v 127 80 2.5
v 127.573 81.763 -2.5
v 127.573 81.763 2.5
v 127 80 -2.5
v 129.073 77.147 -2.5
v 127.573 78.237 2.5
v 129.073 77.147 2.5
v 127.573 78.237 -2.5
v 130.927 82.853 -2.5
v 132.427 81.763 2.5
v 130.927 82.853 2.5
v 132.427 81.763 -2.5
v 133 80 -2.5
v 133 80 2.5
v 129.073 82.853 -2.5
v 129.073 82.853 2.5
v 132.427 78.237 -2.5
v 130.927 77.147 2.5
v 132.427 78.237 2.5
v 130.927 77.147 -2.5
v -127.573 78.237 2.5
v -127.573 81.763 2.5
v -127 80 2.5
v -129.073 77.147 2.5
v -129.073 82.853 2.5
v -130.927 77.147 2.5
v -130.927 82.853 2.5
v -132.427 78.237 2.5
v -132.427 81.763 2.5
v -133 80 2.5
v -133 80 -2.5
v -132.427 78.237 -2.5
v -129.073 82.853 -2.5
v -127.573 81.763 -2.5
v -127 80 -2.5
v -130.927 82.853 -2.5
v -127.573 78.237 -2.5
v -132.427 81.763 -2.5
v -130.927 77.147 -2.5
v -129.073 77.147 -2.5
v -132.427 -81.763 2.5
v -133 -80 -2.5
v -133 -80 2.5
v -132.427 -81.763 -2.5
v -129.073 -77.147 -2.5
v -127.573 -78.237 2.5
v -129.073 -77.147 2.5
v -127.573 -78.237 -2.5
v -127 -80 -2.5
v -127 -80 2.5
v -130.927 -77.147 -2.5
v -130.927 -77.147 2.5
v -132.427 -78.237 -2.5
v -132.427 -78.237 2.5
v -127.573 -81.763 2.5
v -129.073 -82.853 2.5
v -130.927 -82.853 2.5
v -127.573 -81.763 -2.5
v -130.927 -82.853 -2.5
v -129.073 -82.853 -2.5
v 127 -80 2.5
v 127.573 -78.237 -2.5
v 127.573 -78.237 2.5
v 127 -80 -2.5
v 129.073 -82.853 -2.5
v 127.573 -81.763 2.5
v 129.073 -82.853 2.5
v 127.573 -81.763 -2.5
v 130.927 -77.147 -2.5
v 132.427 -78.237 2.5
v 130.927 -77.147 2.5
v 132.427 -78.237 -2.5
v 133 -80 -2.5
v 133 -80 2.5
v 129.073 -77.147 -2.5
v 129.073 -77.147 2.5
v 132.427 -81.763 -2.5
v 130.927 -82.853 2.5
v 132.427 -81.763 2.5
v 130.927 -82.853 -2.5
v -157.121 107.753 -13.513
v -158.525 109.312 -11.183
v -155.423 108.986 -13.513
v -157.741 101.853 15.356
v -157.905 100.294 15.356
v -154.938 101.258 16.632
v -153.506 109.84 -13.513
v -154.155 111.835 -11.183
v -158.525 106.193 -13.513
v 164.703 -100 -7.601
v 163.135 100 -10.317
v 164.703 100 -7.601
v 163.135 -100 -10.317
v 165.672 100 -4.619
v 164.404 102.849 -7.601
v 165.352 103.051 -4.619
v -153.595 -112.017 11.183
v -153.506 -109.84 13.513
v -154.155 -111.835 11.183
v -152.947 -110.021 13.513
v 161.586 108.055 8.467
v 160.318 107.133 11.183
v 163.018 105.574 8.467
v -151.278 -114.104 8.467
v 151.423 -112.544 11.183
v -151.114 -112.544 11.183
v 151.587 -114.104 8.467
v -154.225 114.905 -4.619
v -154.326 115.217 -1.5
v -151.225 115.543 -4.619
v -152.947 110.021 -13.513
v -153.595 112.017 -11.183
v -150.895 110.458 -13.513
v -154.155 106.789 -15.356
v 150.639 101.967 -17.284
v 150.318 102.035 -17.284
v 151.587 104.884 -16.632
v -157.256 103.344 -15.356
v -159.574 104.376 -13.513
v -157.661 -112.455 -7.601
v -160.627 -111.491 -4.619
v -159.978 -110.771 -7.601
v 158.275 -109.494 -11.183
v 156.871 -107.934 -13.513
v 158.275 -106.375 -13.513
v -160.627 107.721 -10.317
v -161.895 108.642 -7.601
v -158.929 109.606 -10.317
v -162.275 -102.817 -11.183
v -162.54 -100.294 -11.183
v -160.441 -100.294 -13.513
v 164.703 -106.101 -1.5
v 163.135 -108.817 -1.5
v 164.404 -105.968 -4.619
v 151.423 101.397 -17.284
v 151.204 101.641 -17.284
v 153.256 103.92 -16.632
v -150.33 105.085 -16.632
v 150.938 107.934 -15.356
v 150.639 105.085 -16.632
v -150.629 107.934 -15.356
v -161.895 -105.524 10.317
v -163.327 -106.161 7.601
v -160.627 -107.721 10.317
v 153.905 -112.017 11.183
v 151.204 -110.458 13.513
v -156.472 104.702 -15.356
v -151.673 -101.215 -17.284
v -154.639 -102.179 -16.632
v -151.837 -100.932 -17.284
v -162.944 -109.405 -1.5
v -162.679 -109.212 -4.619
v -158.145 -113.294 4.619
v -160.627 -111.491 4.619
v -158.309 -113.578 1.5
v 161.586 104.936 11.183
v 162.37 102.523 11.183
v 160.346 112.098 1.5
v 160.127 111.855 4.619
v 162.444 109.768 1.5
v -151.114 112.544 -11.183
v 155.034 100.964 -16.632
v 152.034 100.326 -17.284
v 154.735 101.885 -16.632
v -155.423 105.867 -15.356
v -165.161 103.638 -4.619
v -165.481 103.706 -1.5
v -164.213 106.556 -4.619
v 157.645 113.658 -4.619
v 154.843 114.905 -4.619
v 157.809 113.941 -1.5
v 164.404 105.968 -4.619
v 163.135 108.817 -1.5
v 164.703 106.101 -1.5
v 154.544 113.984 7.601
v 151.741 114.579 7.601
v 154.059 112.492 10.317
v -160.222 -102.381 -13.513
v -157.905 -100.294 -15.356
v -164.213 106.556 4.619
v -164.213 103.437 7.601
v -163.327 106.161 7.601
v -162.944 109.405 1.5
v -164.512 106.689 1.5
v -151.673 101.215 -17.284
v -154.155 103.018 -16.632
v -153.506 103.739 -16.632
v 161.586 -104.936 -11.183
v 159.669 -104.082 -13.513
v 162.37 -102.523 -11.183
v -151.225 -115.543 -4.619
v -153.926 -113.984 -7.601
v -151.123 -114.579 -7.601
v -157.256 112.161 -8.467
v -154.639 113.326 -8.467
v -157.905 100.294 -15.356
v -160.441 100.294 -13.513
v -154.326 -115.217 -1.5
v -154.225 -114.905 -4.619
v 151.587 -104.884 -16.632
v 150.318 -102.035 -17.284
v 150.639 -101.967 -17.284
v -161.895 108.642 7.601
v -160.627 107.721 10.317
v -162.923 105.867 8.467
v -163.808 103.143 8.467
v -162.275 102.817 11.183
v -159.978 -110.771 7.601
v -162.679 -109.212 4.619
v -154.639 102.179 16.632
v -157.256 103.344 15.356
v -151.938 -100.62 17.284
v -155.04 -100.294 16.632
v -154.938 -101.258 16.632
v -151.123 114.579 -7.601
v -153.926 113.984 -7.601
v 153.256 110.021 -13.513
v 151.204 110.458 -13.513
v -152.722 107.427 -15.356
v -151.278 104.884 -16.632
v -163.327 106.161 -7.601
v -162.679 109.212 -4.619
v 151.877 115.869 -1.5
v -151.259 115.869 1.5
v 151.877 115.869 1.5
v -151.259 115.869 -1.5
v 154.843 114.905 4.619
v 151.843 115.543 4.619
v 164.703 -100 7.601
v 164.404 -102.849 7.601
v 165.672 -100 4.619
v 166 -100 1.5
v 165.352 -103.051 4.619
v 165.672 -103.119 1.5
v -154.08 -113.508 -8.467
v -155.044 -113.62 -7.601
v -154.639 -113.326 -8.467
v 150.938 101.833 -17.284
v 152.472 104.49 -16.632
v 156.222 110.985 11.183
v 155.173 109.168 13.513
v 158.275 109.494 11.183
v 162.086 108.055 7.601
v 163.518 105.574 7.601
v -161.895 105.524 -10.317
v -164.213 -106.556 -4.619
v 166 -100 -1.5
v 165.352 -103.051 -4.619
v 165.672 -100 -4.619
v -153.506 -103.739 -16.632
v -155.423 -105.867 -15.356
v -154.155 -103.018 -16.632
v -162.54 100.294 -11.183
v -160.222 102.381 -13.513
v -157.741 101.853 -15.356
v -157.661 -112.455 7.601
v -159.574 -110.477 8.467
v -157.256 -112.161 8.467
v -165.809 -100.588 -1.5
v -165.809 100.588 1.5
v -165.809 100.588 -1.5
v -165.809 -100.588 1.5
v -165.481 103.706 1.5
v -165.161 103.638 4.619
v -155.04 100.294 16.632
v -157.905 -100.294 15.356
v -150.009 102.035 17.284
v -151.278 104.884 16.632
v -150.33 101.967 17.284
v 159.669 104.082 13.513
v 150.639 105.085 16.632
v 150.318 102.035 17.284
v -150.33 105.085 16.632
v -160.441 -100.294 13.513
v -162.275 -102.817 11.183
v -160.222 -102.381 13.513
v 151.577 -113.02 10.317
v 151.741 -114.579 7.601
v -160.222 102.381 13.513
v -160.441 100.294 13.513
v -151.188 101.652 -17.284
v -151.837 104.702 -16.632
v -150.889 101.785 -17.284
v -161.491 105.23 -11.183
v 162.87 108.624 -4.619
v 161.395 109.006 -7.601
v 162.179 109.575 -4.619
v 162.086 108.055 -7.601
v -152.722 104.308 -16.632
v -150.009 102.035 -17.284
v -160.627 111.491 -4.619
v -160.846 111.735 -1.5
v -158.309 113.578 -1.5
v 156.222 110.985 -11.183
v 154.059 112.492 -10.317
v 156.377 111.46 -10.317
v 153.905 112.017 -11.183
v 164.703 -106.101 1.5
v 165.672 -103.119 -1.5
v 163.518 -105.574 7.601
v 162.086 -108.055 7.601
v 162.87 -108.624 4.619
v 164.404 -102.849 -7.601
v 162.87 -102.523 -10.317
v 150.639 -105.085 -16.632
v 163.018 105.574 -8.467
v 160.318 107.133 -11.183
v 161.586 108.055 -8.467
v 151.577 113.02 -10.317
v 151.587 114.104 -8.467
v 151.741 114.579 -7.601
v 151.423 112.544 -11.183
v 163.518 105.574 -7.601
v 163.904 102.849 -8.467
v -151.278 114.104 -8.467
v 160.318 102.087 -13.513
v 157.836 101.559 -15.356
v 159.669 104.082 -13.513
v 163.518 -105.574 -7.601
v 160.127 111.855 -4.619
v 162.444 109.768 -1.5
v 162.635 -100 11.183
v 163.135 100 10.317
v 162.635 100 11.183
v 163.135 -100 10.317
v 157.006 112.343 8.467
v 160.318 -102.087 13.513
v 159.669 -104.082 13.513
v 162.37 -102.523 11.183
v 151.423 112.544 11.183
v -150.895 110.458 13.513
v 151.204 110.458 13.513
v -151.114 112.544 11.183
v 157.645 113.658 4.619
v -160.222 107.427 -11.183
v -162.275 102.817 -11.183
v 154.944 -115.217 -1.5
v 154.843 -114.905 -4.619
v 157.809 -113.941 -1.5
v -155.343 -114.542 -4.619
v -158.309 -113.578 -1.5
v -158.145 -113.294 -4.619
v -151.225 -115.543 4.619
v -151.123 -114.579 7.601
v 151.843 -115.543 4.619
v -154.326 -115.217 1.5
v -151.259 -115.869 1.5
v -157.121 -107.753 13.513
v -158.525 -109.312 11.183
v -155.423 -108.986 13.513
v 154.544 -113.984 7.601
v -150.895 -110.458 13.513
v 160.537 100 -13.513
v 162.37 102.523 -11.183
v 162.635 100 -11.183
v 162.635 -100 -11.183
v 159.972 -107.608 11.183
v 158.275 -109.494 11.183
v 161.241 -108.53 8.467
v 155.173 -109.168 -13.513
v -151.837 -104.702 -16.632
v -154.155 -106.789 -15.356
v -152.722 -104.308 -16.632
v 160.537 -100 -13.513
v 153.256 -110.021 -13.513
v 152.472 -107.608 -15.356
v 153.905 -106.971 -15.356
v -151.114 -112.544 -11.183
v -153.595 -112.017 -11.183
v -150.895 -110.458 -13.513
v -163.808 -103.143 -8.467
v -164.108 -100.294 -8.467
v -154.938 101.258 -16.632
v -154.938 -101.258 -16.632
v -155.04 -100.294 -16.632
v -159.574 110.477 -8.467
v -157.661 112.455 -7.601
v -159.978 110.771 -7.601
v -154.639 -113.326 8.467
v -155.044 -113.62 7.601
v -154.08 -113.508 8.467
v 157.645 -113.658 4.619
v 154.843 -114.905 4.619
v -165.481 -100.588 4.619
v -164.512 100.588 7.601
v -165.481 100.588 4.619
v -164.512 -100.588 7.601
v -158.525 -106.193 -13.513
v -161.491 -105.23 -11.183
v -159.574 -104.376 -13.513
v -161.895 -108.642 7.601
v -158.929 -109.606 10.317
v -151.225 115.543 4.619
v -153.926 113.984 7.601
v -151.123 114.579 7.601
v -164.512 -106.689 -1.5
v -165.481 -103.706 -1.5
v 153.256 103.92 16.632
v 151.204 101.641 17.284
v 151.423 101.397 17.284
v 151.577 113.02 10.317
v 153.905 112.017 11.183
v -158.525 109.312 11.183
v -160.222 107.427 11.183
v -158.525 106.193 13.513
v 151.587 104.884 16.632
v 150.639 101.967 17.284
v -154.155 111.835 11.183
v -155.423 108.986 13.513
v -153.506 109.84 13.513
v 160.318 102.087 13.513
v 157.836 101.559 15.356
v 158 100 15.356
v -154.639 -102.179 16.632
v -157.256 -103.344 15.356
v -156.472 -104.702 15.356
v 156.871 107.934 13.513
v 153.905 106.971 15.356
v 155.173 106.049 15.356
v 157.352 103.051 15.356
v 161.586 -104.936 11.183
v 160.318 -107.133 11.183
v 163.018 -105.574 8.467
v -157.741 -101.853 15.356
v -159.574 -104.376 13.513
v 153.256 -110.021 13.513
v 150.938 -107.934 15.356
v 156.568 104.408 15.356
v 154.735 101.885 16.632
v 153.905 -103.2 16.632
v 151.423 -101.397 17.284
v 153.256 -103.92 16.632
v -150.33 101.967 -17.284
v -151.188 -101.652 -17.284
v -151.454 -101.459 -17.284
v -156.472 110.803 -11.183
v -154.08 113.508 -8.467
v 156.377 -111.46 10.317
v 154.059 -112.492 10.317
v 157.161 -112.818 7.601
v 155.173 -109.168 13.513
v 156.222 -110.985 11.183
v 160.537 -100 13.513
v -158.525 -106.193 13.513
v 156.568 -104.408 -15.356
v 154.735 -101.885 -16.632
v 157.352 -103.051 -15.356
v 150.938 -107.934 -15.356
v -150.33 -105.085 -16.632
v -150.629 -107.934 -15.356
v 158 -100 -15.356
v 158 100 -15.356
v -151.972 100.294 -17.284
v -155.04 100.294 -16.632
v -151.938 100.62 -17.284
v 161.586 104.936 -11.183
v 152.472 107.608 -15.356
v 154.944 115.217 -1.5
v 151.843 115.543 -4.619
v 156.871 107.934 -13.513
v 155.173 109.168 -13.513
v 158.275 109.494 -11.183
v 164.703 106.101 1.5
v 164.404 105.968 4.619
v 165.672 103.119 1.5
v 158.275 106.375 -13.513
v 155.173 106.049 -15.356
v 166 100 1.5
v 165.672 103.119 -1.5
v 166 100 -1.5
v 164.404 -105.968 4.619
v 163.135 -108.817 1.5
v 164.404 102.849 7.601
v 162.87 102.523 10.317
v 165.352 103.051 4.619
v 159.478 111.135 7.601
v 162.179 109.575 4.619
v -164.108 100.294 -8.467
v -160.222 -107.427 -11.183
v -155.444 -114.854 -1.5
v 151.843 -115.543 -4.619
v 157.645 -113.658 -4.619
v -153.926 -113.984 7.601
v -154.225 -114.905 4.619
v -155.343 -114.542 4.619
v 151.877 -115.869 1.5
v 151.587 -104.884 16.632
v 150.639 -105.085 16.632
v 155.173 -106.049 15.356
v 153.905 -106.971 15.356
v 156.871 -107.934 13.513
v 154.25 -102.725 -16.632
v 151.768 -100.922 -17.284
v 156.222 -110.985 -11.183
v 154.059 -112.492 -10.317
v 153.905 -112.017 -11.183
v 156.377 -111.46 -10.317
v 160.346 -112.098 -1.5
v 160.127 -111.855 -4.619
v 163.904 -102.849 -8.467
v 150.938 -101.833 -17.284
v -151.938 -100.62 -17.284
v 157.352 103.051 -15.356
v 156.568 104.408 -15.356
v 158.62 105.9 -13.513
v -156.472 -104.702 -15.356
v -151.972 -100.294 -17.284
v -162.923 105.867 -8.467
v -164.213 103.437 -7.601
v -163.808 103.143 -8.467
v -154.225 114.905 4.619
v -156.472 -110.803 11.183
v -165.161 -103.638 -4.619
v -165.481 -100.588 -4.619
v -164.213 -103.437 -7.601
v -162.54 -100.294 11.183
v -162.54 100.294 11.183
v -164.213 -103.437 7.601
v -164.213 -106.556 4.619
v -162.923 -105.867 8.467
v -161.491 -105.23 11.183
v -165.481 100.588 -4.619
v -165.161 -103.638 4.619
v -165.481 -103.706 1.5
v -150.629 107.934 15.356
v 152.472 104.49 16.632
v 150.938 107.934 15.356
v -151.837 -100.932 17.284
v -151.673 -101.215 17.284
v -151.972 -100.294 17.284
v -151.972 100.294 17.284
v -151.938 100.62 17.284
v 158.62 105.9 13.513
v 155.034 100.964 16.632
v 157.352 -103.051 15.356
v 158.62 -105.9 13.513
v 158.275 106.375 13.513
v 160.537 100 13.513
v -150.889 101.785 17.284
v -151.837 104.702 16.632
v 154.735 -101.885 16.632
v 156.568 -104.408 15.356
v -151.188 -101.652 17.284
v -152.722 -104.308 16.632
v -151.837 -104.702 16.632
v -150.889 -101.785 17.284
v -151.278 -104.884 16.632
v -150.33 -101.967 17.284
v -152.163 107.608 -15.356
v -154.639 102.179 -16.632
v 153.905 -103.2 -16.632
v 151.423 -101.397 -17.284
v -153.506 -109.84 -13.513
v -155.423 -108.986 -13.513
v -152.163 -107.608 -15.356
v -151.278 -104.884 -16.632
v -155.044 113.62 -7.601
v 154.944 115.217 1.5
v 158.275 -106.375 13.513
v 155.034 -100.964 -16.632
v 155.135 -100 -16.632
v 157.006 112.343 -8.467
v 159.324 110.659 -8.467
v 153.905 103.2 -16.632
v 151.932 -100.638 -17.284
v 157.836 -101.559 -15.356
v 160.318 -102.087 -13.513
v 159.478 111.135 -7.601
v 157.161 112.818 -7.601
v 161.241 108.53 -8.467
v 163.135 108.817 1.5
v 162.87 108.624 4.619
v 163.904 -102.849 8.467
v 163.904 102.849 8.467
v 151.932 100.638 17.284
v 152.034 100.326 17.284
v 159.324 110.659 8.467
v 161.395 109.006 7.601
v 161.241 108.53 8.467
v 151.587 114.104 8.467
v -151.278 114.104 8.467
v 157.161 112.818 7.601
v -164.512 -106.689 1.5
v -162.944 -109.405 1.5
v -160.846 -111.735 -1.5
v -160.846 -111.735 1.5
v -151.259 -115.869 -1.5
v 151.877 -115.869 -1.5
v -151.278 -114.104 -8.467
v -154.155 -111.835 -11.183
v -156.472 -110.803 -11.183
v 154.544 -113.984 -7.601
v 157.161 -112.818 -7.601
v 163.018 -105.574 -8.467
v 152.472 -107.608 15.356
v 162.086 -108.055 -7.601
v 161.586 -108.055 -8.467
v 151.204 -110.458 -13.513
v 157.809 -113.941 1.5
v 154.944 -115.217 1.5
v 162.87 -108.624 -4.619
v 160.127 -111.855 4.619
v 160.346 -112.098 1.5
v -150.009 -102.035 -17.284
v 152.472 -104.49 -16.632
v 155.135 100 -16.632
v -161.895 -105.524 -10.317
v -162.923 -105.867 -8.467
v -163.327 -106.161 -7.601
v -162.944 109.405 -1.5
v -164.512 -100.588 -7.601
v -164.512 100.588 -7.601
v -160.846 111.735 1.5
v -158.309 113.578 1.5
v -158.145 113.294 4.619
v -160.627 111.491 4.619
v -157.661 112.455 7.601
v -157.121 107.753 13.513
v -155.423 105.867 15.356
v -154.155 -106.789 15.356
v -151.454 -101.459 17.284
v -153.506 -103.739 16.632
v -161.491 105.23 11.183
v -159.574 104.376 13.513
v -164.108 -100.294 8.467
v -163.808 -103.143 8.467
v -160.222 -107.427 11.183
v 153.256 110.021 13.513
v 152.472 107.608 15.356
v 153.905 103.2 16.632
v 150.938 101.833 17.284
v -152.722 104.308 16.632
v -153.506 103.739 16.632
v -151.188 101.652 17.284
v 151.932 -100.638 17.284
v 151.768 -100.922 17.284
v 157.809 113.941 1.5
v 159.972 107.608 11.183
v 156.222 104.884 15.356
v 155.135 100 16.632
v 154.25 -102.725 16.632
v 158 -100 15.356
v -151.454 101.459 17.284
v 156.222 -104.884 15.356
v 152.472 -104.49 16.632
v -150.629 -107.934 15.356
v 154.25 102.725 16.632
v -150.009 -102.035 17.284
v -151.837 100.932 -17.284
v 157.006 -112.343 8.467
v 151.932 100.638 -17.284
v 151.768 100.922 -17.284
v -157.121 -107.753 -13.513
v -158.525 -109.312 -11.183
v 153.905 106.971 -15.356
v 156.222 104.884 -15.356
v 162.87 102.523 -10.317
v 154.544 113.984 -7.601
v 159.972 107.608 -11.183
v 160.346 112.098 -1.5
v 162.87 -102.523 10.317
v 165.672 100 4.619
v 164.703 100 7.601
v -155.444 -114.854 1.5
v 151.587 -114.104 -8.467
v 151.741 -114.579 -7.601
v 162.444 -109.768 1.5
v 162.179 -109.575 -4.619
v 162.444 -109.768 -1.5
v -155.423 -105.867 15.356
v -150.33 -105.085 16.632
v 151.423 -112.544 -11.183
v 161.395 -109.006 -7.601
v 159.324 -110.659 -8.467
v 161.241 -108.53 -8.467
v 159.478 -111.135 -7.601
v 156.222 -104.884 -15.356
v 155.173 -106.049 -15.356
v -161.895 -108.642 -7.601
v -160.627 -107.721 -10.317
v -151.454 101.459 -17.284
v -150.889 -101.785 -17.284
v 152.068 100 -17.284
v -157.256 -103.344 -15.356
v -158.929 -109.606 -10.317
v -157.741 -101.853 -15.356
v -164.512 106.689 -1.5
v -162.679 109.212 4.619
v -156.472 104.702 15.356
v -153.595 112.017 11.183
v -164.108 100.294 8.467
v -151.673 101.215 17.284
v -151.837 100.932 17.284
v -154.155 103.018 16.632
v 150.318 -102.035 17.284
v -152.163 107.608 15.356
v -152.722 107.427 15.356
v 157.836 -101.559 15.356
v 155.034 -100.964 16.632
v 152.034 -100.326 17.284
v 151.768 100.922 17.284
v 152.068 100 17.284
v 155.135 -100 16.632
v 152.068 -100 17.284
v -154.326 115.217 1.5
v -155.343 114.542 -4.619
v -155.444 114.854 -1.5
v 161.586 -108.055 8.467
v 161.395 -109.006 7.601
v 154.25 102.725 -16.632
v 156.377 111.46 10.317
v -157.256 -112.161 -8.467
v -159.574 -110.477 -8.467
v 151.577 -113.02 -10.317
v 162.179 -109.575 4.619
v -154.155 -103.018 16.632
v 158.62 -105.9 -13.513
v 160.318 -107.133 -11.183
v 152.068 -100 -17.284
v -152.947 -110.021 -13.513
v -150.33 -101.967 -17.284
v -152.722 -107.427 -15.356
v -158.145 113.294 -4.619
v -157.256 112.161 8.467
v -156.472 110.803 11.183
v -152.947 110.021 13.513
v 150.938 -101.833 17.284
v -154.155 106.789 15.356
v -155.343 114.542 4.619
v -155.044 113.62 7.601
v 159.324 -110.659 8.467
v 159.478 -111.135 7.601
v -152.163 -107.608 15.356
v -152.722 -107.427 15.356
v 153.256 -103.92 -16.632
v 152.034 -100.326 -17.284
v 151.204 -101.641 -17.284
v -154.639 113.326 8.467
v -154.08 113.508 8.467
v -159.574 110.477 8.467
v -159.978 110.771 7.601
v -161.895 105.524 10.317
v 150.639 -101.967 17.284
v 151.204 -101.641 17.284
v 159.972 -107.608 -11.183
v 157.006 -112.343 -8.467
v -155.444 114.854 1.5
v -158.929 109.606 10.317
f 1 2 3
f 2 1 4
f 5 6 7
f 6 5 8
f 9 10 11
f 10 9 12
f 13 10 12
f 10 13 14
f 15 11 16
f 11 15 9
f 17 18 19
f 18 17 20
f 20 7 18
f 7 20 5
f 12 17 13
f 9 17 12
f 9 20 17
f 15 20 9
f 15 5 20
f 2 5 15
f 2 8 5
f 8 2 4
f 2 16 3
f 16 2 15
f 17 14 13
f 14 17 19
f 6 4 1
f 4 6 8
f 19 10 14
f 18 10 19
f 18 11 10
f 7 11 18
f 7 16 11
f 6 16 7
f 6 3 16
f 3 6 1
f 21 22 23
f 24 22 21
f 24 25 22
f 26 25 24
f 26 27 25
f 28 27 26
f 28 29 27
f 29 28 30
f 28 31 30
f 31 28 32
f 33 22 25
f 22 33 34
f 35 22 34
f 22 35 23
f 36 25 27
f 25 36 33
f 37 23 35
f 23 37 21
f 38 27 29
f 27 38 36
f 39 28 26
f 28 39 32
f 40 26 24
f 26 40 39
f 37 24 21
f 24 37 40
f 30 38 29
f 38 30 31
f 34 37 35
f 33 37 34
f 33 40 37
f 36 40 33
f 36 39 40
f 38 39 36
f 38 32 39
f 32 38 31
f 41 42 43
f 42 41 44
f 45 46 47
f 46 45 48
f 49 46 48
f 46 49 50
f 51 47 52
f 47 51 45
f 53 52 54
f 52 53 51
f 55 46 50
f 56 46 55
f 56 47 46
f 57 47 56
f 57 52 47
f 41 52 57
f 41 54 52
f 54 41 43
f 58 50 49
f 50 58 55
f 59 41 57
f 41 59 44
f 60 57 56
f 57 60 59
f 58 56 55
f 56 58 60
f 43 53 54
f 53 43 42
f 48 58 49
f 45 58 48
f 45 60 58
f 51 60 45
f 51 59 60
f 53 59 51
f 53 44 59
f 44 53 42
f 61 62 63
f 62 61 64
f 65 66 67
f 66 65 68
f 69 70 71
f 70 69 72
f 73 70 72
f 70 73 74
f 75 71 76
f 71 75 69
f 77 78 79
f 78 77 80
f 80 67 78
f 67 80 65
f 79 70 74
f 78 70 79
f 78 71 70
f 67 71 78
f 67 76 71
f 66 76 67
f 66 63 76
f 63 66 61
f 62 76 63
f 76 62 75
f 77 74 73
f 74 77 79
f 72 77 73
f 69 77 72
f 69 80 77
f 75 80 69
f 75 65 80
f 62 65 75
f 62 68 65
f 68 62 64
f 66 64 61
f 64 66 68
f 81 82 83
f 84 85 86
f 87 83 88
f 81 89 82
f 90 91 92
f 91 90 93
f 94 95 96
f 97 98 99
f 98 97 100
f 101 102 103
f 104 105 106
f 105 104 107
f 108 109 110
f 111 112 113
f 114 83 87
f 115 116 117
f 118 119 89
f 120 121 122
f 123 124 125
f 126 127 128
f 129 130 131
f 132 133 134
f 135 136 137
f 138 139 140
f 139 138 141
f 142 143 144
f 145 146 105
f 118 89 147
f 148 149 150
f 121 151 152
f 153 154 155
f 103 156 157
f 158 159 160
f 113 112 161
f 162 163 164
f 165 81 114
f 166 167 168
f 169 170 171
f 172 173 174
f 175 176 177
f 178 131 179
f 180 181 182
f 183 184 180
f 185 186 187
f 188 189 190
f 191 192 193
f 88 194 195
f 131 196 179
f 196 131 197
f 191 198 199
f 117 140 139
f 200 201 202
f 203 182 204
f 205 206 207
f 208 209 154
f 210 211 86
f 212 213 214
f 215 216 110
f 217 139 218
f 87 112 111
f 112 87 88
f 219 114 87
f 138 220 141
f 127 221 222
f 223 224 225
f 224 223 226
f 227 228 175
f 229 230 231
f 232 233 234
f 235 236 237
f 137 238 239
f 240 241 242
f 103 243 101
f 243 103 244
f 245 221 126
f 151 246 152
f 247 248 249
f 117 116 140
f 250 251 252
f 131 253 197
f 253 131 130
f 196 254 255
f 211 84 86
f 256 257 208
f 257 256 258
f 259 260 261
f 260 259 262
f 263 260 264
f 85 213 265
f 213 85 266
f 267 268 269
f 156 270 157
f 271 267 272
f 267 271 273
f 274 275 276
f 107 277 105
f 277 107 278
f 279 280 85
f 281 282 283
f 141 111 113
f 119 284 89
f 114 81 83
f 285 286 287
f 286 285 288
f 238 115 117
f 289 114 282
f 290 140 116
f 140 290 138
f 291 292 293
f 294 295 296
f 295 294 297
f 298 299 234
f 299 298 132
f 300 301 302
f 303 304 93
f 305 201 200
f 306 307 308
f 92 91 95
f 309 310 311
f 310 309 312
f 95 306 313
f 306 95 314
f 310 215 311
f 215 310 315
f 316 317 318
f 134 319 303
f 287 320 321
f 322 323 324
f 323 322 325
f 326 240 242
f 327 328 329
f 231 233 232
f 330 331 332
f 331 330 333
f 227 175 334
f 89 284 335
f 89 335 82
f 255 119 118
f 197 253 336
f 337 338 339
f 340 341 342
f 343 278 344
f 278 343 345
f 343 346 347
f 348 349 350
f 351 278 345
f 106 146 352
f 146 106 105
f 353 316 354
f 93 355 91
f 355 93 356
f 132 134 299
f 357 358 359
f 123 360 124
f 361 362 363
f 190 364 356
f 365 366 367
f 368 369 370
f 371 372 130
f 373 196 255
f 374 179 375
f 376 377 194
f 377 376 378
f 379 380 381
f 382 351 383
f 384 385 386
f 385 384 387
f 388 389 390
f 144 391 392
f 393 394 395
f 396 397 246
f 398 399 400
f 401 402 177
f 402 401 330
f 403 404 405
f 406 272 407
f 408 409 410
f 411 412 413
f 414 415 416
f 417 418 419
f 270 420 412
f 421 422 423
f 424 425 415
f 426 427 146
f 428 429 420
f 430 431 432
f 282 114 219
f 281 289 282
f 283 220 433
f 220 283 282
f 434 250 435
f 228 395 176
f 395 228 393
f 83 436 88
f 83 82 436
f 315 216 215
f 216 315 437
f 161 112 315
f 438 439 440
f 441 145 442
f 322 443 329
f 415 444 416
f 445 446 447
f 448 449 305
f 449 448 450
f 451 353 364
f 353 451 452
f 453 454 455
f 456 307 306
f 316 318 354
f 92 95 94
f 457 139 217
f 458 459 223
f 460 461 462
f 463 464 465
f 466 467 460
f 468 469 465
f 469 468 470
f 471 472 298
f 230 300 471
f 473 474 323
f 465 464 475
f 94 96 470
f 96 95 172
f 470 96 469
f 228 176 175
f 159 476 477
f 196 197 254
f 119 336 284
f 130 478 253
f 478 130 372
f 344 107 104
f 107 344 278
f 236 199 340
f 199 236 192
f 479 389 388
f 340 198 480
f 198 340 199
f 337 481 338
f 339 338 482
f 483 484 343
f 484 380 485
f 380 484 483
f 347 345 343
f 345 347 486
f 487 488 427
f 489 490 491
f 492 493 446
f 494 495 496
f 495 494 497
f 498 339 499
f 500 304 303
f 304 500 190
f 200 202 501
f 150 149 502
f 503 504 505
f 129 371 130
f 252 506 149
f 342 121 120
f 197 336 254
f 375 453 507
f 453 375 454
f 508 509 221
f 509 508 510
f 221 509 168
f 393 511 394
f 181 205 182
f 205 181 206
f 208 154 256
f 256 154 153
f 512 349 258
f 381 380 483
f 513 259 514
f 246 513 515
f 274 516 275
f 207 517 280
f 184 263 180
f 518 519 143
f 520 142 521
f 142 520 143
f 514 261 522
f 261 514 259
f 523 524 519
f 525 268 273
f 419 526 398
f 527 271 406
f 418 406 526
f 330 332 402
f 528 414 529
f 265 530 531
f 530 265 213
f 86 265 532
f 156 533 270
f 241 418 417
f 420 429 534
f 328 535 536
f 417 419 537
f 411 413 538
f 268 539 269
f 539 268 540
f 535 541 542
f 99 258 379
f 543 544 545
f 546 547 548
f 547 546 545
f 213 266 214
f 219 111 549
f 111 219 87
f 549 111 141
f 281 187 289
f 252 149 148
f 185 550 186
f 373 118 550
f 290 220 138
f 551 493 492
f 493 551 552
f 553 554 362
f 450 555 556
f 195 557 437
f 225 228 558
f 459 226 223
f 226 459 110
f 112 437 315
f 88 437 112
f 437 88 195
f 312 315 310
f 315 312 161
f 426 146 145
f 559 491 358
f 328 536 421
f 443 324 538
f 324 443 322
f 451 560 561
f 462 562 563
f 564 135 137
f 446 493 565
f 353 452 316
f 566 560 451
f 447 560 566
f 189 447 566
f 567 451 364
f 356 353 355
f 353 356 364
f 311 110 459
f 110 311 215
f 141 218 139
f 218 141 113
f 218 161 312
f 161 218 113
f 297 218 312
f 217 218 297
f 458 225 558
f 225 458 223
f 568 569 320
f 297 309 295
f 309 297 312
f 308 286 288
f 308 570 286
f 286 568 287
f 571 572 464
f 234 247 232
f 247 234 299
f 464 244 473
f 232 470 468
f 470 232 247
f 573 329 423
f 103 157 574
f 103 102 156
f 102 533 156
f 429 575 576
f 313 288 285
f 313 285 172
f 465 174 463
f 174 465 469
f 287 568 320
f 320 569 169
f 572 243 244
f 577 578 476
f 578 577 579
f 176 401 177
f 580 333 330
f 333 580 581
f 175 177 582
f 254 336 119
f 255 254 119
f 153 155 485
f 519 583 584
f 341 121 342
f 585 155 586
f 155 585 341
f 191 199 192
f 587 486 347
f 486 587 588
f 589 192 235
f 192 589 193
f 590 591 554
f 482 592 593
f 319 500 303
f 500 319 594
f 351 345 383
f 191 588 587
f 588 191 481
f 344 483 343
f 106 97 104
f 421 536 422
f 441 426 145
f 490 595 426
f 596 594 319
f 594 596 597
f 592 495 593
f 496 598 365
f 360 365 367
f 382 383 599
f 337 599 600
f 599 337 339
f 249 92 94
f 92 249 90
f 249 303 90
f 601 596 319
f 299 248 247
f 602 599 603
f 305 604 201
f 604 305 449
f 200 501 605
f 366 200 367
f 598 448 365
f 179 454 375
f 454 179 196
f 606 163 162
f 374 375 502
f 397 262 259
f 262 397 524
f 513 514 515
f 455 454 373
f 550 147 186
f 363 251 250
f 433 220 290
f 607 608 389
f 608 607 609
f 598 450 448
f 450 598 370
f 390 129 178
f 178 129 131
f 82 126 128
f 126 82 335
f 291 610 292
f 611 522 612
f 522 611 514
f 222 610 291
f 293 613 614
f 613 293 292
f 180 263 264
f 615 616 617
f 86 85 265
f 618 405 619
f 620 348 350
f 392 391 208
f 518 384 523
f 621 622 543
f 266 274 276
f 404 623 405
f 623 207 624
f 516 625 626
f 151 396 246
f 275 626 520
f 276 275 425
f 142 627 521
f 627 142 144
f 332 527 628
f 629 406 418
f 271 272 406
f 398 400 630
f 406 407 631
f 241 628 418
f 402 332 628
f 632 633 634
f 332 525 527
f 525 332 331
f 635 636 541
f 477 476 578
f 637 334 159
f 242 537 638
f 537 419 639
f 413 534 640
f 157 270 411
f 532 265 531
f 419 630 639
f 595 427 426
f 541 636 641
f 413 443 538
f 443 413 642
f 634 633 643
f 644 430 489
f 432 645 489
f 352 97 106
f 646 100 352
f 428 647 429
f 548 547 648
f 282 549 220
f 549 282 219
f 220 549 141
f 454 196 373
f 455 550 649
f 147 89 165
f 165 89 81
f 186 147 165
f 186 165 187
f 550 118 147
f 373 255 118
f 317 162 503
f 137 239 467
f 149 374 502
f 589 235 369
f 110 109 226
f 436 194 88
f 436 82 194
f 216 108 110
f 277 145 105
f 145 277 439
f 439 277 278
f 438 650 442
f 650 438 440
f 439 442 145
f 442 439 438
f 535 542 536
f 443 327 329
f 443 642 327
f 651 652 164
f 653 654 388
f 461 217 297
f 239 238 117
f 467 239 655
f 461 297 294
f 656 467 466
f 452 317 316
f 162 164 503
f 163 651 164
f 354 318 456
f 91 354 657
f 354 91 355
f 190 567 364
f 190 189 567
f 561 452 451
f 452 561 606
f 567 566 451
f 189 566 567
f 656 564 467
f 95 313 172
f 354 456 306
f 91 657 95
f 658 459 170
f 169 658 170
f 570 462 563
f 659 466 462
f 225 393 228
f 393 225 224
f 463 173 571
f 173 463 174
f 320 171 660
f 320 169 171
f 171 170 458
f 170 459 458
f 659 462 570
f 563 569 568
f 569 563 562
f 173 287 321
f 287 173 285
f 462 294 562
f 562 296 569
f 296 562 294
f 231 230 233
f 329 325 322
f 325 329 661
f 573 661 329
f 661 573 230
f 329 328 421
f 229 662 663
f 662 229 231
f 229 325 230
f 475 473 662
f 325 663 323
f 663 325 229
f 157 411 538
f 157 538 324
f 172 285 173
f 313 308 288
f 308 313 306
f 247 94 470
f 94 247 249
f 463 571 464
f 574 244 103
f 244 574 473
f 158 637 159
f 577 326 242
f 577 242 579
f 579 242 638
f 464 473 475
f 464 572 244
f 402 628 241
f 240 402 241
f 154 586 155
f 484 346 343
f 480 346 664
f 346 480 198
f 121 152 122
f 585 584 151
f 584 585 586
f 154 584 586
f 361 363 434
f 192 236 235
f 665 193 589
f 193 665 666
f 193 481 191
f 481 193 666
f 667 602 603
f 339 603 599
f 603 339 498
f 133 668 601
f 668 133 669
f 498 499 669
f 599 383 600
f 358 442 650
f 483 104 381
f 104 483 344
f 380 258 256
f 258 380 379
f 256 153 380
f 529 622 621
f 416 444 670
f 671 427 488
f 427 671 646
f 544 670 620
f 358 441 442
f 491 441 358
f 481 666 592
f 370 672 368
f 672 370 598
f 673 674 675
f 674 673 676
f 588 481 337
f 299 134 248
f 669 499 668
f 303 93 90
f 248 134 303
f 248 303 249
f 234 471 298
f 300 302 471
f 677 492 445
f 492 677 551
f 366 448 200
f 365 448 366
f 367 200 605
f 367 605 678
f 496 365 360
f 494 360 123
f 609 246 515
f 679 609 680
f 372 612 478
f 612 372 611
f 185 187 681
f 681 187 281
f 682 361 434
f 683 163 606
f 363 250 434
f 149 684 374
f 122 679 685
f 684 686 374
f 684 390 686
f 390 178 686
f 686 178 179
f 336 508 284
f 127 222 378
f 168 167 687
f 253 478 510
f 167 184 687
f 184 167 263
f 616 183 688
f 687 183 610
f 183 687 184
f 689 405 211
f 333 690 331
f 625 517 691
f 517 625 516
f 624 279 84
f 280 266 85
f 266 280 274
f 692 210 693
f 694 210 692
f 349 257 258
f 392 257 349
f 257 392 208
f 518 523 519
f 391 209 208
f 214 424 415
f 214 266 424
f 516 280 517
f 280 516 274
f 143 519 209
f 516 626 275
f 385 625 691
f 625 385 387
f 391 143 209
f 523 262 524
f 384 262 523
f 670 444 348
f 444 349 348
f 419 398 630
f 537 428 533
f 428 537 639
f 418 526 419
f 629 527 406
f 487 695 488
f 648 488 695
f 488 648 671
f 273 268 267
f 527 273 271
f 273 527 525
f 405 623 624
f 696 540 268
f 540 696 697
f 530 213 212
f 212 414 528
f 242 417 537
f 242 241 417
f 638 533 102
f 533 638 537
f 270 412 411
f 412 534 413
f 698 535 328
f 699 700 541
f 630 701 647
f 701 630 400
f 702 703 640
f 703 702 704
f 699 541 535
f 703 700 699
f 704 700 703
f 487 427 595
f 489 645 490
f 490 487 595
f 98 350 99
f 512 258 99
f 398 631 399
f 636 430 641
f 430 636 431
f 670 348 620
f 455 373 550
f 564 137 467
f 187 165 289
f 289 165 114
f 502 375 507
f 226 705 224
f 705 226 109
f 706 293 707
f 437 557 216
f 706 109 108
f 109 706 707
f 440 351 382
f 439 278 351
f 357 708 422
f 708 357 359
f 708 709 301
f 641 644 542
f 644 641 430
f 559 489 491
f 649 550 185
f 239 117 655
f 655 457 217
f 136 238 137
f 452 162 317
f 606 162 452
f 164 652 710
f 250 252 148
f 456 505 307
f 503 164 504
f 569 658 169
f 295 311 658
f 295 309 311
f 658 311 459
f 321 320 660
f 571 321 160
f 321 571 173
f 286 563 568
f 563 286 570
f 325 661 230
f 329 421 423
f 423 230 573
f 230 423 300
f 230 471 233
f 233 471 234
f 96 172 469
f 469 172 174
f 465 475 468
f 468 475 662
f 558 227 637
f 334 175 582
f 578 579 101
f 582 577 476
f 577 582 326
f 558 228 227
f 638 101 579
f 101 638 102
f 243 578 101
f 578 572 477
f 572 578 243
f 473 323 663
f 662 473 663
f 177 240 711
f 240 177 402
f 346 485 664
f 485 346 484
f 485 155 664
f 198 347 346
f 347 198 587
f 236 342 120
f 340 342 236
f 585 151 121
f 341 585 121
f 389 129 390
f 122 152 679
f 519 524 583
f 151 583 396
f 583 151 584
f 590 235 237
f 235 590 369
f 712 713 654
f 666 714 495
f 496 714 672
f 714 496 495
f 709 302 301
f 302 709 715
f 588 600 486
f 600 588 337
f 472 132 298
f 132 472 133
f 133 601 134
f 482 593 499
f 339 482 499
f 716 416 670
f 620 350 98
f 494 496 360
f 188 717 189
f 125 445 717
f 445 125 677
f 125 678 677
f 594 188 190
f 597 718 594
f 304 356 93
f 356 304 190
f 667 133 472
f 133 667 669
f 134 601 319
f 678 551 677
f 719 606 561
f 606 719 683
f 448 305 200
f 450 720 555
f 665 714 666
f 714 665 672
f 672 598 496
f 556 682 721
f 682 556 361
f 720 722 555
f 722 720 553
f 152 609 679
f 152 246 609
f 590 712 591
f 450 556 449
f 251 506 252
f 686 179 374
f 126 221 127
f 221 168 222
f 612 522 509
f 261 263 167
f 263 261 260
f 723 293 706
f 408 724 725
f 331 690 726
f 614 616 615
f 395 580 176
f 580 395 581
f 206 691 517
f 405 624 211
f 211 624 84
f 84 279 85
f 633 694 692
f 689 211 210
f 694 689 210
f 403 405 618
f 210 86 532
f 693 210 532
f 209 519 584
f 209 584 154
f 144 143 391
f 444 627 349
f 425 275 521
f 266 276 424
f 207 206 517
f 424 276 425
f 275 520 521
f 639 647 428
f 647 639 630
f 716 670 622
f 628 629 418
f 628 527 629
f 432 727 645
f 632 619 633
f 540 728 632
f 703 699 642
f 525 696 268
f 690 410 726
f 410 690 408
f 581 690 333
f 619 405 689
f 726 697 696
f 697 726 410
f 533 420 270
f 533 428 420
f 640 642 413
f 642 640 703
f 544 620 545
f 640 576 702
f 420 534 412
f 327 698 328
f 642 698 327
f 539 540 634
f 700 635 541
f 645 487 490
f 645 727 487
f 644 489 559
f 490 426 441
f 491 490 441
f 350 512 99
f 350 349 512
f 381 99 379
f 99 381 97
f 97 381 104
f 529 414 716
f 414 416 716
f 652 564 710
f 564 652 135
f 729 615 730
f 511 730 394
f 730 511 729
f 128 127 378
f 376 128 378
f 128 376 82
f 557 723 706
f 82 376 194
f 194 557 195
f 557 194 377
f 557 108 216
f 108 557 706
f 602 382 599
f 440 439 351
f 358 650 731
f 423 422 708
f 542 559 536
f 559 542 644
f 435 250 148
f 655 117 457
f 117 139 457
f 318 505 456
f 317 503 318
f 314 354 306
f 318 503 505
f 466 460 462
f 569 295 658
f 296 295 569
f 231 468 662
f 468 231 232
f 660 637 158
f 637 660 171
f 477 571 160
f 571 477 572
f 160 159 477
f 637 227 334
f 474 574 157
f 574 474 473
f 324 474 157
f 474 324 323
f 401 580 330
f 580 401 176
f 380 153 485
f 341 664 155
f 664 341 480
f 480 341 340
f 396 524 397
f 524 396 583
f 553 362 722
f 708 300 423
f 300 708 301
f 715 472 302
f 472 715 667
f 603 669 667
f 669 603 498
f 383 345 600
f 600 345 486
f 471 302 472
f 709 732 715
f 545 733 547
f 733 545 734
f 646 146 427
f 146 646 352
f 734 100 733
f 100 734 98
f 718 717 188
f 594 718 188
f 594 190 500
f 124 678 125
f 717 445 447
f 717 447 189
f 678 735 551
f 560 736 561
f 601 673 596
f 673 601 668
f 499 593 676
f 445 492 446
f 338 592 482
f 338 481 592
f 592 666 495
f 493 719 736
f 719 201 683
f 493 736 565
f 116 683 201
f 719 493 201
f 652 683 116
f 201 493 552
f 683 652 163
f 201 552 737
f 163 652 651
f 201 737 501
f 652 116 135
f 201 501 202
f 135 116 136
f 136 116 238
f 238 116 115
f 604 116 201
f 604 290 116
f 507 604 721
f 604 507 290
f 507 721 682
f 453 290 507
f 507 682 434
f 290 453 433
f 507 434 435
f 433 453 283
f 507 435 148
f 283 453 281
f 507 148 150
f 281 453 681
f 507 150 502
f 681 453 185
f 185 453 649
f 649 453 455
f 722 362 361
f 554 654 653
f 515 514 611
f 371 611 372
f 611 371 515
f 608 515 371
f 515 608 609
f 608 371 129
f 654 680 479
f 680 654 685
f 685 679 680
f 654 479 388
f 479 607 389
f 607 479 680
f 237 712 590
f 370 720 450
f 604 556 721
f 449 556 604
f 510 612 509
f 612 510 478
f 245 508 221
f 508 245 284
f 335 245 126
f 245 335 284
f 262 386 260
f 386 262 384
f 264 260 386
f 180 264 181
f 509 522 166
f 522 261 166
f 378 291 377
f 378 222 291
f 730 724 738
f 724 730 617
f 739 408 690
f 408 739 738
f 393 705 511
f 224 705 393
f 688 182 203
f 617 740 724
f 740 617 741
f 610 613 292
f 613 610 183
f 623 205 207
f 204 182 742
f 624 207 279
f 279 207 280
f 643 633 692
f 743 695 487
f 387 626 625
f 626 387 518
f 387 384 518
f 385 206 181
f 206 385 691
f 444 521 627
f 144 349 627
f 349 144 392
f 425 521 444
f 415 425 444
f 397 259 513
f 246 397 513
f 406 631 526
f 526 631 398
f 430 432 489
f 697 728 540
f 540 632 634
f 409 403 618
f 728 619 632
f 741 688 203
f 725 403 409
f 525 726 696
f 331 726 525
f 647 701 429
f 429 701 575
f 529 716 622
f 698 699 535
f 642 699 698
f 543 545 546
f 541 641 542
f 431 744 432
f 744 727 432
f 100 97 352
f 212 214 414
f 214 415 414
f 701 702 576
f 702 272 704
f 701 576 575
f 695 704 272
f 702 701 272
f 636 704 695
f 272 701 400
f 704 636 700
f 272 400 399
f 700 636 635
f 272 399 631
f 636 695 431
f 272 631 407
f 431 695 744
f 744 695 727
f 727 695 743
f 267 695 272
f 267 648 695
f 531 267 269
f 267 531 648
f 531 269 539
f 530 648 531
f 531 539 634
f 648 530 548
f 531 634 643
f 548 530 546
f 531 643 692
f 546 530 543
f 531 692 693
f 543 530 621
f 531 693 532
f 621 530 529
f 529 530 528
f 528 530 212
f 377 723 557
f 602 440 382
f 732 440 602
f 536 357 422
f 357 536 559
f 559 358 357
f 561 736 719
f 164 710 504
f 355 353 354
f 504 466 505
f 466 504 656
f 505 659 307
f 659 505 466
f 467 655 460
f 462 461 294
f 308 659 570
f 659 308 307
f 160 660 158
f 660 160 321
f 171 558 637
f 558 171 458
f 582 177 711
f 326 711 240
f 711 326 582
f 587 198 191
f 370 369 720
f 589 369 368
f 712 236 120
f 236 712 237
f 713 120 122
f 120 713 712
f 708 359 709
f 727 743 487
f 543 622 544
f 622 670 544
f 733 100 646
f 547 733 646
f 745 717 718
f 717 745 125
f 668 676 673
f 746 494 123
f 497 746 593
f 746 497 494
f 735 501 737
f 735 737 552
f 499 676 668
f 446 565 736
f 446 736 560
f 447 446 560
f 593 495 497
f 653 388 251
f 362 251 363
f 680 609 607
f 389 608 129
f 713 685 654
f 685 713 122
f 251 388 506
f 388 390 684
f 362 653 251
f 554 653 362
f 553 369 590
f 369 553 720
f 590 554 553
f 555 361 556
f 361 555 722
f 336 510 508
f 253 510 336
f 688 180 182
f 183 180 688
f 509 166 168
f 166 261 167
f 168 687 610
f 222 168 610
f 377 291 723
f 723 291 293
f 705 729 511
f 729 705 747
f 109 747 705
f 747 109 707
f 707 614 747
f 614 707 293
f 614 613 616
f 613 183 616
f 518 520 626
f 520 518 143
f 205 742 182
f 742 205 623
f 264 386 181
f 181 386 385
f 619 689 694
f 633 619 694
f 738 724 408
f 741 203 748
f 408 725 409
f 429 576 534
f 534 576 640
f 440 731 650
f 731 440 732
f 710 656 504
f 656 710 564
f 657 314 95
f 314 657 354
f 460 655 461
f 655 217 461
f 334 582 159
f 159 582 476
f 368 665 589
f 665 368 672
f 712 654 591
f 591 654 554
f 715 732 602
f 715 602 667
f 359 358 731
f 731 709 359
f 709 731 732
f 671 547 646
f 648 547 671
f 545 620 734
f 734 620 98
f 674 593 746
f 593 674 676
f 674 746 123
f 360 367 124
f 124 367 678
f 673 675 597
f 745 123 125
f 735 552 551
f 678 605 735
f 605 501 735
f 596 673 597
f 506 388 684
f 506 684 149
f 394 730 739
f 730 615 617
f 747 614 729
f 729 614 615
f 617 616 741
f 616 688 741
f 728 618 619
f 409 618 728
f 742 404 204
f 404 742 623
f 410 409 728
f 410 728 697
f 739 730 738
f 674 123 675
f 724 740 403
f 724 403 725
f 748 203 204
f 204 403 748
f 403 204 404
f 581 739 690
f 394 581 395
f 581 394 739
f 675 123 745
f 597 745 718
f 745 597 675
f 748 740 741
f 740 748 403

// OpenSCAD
// Parameters
sheet_length = 300; //[150:600:1]
sheet_width = 200; //[100:400:1]
sheet_thickness = 3; //[1.5:6:0.5]
corner_radius = 15; //[7.5:30:0.5]
chamfer_size = 1; //[0.5:2:0.1]
hole_diameter = 6; //[3:12:0.5]
hole_edge_offset = 20; //[10:40:1]
hole_clearance_z = 2; //[1:5:0.5]

// Base shapes
module acrylic_sheet() {
  cube([sheet_length, sheet_width, sheet_thickness], center=true);
}

module rounded_corners() {
  sphere(r=corner_radius, center=true);
}

module edge_chamfer() {
  sphere(r=chamfer_size, center=true);
}

module mounting_hole(position) {
  translate(position)
    cylinder(h=sheet_thickness + hole_clearance_z, r=hole_diameter/2, center=true);
}

// Operations
module sheet_with_rounded_corners() {
  minkowski() {
    acrylic_sheet();
    rounded_corners();
  }
}

module sheet_with_edge_chamfer() {
  minkowski() {
    sheet_with_rounded_corners();
    edge_chamfer();
  }
}

module mounting_holes() {
  union() {
    mounting_hole([sheet_length/2 - hole_edge_offset, sheet_width/2 - hole_edge_offset, 0]);
    mounting_hole([-sheet_length/2 + hole_edge_offset, sheet_width/2 - hole_edge_offset, 0]);
    mounting_hole([-sheet_length/2 + hole_edge_offset, -sheet_width/2 + hole_edge_offset, 0]);
    mounting_hole([sheet_length/2 - hole_edge_offset, -sheet_width/2 + hole_edge_offset, 0]);
  }
}

// Final output
difference() {
  sheet_with_edge_chamfer();
  mounting_holes();
}
